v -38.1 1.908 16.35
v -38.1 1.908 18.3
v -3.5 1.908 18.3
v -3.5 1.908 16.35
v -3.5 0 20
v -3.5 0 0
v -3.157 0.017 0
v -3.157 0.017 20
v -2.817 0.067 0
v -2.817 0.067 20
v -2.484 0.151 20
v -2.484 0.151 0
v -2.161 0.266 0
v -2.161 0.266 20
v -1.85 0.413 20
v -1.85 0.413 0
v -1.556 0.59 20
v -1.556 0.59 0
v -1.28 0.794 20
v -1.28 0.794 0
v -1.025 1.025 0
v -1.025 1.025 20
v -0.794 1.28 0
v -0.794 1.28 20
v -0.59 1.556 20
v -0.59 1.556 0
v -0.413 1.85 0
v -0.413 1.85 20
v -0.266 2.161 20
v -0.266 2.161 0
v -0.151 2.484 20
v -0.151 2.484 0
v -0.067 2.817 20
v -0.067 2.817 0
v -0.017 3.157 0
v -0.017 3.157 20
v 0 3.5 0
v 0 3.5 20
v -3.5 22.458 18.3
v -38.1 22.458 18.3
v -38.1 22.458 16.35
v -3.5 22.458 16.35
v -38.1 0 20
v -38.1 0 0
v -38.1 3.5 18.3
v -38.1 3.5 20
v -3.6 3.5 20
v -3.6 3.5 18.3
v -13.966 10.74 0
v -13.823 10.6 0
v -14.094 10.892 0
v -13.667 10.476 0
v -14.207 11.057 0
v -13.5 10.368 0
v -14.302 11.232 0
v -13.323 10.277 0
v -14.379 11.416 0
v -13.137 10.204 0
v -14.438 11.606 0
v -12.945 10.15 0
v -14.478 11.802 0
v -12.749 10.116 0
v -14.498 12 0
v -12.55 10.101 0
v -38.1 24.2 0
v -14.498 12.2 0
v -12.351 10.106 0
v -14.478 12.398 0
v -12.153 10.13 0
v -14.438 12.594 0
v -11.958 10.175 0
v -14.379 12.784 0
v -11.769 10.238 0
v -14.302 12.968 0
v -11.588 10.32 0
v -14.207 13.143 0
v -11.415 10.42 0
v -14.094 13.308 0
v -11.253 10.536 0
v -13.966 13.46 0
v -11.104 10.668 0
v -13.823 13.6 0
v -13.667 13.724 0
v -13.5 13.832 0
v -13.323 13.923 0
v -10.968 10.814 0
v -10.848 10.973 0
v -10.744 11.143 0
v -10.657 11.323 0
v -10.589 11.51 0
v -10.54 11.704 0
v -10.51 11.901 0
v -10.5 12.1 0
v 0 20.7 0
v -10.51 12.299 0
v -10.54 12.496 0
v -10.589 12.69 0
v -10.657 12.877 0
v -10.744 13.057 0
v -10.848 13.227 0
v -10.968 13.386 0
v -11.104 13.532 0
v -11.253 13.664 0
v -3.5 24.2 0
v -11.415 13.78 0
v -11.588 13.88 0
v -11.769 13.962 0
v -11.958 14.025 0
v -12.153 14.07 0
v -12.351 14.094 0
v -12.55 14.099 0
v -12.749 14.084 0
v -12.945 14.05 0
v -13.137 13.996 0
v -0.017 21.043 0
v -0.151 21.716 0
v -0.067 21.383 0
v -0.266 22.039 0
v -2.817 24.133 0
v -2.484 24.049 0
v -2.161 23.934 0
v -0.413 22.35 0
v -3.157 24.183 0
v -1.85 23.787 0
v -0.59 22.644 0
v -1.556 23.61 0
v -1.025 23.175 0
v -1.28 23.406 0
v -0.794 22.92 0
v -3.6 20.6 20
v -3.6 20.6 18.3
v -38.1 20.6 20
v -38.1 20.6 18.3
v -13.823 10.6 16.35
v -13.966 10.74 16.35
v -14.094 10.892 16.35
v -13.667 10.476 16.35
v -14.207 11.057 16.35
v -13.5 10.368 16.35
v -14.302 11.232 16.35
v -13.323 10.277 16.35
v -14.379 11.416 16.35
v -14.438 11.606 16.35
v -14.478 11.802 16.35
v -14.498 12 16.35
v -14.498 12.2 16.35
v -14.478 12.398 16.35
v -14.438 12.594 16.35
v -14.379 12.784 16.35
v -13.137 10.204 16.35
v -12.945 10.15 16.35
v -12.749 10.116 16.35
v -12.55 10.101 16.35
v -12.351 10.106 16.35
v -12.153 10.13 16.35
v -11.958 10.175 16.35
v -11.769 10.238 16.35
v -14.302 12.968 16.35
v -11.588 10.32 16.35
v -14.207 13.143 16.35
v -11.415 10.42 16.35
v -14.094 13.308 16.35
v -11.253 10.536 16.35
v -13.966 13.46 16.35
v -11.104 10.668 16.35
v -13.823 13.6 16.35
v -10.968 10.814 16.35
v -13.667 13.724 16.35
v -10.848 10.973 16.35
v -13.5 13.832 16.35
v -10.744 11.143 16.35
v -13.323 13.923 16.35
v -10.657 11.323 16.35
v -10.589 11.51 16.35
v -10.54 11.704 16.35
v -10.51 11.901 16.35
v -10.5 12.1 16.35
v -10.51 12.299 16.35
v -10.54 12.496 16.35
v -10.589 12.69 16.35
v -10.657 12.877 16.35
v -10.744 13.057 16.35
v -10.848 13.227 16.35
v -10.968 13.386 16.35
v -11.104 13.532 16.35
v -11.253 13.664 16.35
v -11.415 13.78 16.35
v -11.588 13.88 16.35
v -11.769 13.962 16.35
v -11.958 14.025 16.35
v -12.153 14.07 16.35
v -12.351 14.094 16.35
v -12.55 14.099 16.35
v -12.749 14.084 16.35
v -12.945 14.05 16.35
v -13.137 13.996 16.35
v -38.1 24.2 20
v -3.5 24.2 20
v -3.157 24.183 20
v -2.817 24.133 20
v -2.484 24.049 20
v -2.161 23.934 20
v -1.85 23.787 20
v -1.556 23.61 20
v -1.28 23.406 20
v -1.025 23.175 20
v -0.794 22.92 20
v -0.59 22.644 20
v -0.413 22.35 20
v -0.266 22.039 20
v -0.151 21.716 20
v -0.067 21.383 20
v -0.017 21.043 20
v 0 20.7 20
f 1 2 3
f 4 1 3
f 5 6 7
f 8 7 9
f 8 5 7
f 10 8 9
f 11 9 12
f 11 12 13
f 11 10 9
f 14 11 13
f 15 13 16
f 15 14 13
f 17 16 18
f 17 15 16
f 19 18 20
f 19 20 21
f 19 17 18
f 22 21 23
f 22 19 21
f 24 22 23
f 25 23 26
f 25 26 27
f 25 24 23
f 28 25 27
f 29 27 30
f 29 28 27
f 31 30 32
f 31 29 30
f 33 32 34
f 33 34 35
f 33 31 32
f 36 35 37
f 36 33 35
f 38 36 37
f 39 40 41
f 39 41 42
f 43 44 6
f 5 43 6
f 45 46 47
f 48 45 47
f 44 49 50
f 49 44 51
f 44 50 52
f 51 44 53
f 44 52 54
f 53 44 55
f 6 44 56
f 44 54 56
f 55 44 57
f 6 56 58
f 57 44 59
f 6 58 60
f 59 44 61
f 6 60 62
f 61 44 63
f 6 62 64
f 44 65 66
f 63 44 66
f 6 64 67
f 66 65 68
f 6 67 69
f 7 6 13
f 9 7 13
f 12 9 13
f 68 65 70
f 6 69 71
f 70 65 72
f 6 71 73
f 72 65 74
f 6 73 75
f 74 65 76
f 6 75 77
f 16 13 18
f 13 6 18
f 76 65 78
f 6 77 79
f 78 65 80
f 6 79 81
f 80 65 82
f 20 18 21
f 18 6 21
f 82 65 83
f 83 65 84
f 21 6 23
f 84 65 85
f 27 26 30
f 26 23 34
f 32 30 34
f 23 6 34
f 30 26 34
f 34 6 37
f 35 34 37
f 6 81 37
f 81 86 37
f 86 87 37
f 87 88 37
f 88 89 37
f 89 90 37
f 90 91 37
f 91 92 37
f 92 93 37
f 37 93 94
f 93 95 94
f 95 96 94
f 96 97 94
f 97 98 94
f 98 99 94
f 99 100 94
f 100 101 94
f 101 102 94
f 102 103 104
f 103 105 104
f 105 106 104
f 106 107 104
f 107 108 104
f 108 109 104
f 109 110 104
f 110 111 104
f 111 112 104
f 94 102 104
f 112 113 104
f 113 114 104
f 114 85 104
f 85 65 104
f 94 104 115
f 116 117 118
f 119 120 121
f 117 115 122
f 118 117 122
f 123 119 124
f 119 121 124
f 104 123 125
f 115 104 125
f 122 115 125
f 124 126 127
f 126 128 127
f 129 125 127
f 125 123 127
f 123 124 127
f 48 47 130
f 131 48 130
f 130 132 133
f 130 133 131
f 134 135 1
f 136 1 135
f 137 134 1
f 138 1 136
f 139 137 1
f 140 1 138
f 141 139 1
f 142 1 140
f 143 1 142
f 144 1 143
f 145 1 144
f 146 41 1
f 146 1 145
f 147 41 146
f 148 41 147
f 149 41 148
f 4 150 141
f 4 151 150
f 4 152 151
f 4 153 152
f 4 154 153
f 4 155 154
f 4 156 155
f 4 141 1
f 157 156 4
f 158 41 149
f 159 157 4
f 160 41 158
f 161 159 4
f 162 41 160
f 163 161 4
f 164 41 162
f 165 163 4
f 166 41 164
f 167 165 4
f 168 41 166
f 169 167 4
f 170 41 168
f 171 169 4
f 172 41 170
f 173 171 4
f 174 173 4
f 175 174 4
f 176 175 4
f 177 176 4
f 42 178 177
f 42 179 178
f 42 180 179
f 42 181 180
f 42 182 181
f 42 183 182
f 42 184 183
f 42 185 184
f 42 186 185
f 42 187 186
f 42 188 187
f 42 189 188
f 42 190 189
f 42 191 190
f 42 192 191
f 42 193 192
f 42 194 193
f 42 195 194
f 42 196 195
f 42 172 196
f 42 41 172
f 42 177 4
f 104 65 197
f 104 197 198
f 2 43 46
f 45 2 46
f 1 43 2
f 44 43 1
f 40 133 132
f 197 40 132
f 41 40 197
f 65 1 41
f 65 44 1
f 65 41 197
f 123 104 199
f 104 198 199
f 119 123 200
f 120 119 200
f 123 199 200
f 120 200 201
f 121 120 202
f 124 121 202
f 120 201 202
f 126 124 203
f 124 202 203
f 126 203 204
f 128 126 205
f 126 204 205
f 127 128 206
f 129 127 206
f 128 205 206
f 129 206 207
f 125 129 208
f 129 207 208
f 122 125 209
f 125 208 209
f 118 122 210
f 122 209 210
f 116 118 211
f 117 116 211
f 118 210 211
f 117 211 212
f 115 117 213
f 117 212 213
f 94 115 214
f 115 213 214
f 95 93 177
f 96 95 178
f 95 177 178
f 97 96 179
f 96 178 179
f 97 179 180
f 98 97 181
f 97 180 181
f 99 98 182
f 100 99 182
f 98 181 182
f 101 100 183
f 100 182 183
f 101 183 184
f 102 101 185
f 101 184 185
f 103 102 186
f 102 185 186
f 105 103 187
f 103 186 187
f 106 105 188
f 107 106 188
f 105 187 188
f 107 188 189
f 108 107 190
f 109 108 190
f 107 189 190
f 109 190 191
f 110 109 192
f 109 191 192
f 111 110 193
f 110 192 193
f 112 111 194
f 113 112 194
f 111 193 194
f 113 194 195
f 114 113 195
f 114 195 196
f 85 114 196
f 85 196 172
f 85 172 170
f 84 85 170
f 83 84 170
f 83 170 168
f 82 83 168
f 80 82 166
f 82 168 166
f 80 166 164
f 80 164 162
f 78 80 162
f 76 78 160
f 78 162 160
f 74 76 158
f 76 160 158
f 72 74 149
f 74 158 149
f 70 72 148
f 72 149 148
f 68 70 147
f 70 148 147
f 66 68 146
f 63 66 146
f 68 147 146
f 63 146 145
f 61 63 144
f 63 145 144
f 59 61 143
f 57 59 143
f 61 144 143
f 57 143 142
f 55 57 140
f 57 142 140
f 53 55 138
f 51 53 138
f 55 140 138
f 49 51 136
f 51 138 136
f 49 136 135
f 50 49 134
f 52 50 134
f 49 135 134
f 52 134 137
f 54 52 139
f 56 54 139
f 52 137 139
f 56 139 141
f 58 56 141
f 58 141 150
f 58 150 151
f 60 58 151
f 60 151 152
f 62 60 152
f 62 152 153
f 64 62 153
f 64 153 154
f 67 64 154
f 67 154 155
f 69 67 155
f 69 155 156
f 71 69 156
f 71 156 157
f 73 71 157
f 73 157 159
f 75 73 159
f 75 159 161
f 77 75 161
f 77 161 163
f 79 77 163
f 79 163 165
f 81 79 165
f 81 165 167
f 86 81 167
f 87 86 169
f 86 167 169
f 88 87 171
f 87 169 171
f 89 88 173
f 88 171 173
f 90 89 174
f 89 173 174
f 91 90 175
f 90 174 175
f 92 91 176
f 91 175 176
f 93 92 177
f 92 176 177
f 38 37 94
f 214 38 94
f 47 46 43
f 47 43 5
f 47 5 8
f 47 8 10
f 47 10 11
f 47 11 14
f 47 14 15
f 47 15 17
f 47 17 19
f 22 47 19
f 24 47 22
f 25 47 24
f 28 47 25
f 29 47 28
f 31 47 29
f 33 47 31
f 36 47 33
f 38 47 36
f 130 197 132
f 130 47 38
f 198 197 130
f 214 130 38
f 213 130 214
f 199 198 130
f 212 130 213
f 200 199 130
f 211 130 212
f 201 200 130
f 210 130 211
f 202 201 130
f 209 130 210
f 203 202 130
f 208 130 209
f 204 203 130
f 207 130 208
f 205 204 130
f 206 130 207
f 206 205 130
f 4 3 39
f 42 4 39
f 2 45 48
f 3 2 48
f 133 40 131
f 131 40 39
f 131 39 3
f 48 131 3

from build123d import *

# Parameters (mm, degrees)
F0_W     = 38.1
F0_H     = 24.2
F1_DEPTH = 20
F2_W     = 34.5
F2_H     = 17.1
F3_DEPTH = 1.7
F4_W     = 34.6
F4_H     = 20.55
F5_DEPTH = 1.95
F6_R     = 3.5
F7_R     = 2
F8_DEPTH = 16.35


with BuildPart() as f1:
    # F0 (on Top) → F1 (new body)
    with BuildSketch(Plane.XY):
        with Locations((-19.05, 12.1)):
            Rectangle(F0_W, F0_H)
    extrude(amount=F1_DEPTH)

    # F2 (on face) → F3 (cut)
    with BuildSketch(Plane.XY.offset(20)):
        with Locations((-20.85, 12.05)):
            Rectangle(F2_W, F2_H)
    extrude(amount=-F3_DEPTH, mode=Mode.SUBTRACT)

    # F4 (on face) → F5 (cut)
    with BuildSketch(Plane.XY.offset(18.3)):
        with Locations((-20.8, 12.183178224)):
            Rectangle(F4_W, F4_H)
    extrude(amount=-F5_DEPTH, mode=Mode.SUBTRACT)

    # F6
    f6_edges = [f1.edges().sort_by_distance(p)[0] for p in [
        (0, 24.2, 10),
        (0, 0, 10),
    ]]
    fillet(f6_edges, radius=F6_R)

    # F7 (on face) → F8 (cut, through all)
    with BuildSketch(Plane.XY.offset(16.35)):
        with Locations((-12.5, 12.1)):
            Circle(F7_R)
    extrude(amount=-F8_DEPTH, mode=Mode.SUBTRACT)


solid = f1.part
